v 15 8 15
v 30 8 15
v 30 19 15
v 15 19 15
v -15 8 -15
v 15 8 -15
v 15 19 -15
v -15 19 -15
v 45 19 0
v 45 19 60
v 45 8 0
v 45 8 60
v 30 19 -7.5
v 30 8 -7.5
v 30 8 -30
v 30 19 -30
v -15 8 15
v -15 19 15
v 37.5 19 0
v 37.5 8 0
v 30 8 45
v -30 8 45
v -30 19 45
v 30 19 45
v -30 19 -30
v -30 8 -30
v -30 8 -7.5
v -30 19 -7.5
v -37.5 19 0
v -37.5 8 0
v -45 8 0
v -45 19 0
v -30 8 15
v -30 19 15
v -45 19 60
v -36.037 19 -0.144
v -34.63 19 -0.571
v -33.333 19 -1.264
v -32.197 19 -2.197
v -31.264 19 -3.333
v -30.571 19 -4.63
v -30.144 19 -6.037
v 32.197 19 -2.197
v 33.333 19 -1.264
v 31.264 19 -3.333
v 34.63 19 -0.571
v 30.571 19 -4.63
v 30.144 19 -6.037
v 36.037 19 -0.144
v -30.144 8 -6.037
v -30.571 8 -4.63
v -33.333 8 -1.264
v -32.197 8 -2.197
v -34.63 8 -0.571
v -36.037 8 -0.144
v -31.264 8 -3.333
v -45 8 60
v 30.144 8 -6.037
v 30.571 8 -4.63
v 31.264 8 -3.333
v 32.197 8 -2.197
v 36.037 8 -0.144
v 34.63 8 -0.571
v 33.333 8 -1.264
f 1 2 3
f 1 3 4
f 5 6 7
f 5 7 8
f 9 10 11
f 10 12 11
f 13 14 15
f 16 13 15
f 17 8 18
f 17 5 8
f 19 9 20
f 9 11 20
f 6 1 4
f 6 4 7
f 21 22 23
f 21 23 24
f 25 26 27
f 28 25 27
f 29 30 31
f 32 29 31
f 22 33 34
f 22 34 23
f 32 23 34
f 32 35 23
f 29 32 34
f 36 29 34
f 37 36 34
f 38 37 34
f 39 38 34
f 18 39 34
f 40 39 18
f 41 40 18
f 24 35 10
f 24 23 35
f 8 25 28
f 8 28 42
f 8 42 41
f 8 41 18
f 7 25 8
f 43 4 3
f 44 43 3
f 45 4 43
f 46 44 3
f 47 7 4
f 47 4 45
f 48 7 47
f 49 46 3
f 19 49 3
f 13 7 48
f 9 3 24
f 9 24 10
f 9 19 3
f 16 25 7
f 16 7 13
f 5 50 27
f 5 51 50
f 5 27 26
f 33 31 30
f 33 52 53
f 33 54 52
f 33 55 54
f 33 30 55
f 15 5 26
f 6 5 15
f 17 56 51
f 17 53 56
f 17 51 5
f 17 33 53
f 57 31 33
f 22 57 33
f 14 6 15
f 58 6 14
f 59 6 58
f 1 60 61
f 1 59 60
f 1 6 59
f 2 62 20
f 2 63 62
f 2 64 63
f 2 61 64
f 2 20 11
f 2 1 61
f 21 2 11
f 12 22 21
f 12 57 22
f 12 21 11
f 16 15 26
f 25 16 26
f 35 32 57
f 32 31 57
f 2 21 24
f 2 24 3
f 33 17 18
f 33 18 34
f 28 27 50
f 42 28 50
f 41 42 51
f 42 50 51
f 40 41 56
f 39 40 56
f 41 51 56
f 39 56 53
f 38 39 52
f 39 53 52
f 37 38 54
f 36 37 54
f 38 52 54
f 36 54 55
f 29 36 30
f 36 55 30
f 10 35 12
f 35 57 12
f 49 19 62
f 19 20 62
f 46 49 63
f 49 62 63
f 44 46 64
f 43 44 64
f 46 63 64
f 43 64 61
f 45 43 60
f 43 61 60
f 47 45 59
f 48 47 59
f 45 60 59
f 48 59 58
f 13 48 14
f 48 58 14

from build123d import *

# Parameters (mm, degrees)
CROQUIS1_W                = 30
CROQUIS1_H                = 30
SALIENTE_EXTRUIR1_DEPTH   = 3
CROQUIS2_W                = 15
CROQUIS2_H                = 30
SALIENTE_EXTRUIR3_DEPTH   = 3
SALIENTE_EXTRUIR3_2_DEPTH = 3
CROQUIS3_W                = 30
CROQUIS3_H                = 30
SALIENTE_EXTRUIR4_DEPTH   = 3
SALIENTE_EXTRUIR5_DEPTH   = 3
CORTAR_EXTRUIR1_DEPTH     = 6
SALIENTE_EXTRUIR8_DEPTH   = 11
CROQUIS7_W                = 30
CROQUIS7_H                = 3.175
CORTAR_EXTRUIR3_DEPTH     = 18.542
CROQUIS9_W                = 60
CROQUIS9_H                = 0.175
SALIENTE_EXTRUIR9_DEPTH   = 11
CROQUIS10_W               = 90
CROQUIS10_H               = 5
CORTAR_EXTRUIR5_DEPTH     = 93
CROQUIS11_W               = 30
CROQUIS11_H               = 3.175
SALIENTE_EXTRUIR10_DEPTH  = 11
CROQUIS12_W               = 60
CROQUIS12_H               = 0.175
CORTAR_EXTRUIR6_DEPTH     = 11
CROQUIS13_W               = 30
CROQUIS13_H               = 5
CORTAR_EXTRUIR7_DEPTH     = 10
SALIENTE_EXTRUIR11_DEPTH  = 5


with BuildPart() as part:
    # Croquis1 → Saliente-Extruir1 (new body)
    with BuildSketch(Plane(origin=(0, 0, 0), x_dir=(1, 0, 0), z_dir=(0, 1, 0))):
        Rectangle(CROQUIS1_W, CROQUIS1_H)
    extrude(amount=SALIENTE_EXTRUIR1_DEPTH)



with BuildPart() as body_2:
    # Croquis2 → Saliente-Extruir3 (new body)
    with BuildSketch(Plane(origin=(0, 3, 0), x_dir=(1, 0, 0), z_dir=(0, 1, 0))):
        with Locations((-22.5, -30)):
            Rectangle(CROQUIS2_W, CROQUIS2_H)
    extrude(amount=-SALIENTE_EXTRUIR3_DEPTH)


with BuildPart() as body_3:
    # Croquis2 → Saliente-Extruir3 2 (new body)
    with BuildSketch(Plane(origin=(0, 3, 0), x_dir=(1, 0, 0), z_dir=(0, 1, 0))):
        with Locations((22.5, -30)):
            Rectangle(CROQUIS2_W, CROQUIS2_H)
    extrude(amount=-SALIENTE_EXTRUIR3_2_DEPTH)


with BuildPart() as part_1:
    add(part.part)

    add(body_2.part)  # Saliente-Extruir4 merges body 2

    add(body_3.part)  # Saliente-Extruir4 merges body 3
    # Croquis3 → Saliente-Extruir4 (add)
    with BuildSketch(Plane(origin=(0, 3, 0), x_dir=(1, 0, 0), z_dir=(0, 1, 0))):
        with Locations((0, -30)):
            Rectangle(CROQUIS3_W, CROQUIS3_H)
    extrude(amount=-SALIENTE_EXTRUIR4_DEPTH)

    # Croquis4 → Saliente-Extruir5 (add)
    with BuildSketch(Plane(origin=(0, 3, 0), x_dir=(1, 0, 0), z_dir=(0, 1, 0))):
        Polygon((-30, 0), (-45, 0), (-45, -60), (45, -60), (45, 0), (30, 0), (30, 30), (-30, 30), align=None)
    extrude(amount=SALIENTE_EXTRUIR5_DEPTH)

    # Croquis5 → Cortar-Extruir1 (cut)
    with BuildSketch(Plane(origin=(0, 0, 0), x_dir=(-1, 0, 0), z_dir=(0, -1, 0))):
        Polygon((30, -45), (30, -15), (15, -15), (15, 15), (-15, 15), (-15, -15), (-30, -15), (-30, -45), align=None)
    extrude(amount=-CORTAR_EXTRUIR1_DEPTH, mode=Mode.SUBTRACT)

    # Croquis6 → Saliente-Extruir8 (add)
    with BuildSketch(Plane(origin=(0, 3, 0), x_dir=(-1, 0, 0), z_dir=(0, -1, 0))):
        with BuildLine():
            Line((37.5, 0), (45, 0))
            Line((45, 0), (45, -60))
            Line((45, -60), (-45, -60))
            Line((-45, -60), (-45, 0))
            Line((-45, 0), (-37.5, 0))
            ThreePointArc((-37.5, 0), (-32.196699141, 2.196699141), (-30, 7.5))
            Line((-30, 7.5), (-30, 30))
            Line((-30, 30), (30, 30))
            Line((30, 30), (30, 7.5))
            ThreePointArc((30, 7.5), (32.196699141, 2.196699141), (37.5, 0))
        make_face()
        Polygon((15, 15), (15, -15), (30, -15), (30, -45), (-30, -45), (-30, -15), (-15, -15), (-15, 15), align=None, mode=Mode.SUBTRACT)
    extrude(amount=-SALIENTE_EXTRUIR8_DEPTH)

    # Croquis7 → Cortar-Extruir3 (cut)
    with BuildSketch(Plane(origin=(0, 14, 0), x_dir=(1, 0, 0), z_dir=(0, 1, 0))):
        with Locations((0, 16.5875)):
            Rectangle(CROQUIS7_W, CROQUIS7_H)
    extrude(amount=-CORTAR_EXTRUIR3_DEPTH, mode=Mode.SUBTRACT)

    # Croquis9 → Saliente-Extruir9 (add)
    with BuildSketch(Plane(origin=(0, 14, 0), x_dir=(1, 0, 0), z_dir=(0, 1, 0))):
        with Locations((0, 30.0875)):
            Rectangle(CROQUIS9_W, CROQUIS9_H)
    extrude(amount=-SALIENTE_EXTRUIR9_DEPTH)

    # Croquis10 → Cortar-Extruir5 (cut)
    with BuildSketch(Plane.XY.offset(60)):
        with Locations((0, 5.5)):
            Rectangle(CROQUIS10_W, CROQUIS10_H)
    extrude(amount=-CORTAR_EXTRUIR5_DEPTH, mode=Mode.SUBTRACT)

    # Croquis11 → Saliente-Extruir10 (add)
    with BuildSketch(Plane(origin=(0, 14, 0), x_dir=(1, 0, 0), z_dir=(0, 1, 0))):
        with Locations((0, 16.5875)):
            Rectangle(CROQUIS11_W, CROQUIS11_H)
    extrude(amount=-SALIENTE_EXTRUIR10_DEPTH)

    # Croquis12 → Cortar-Extruir6 (cut)
    with BuildSketch(Plane(origin=(0, 14, 0), x_dir=(1, 0, 0), z_dir=(0, 1, 0))):
        with Locations((0, 30.0875)):
            Rectangle(CROQUIS12_W, CROQUIS12_H)
    extrude(amount=-CORTAR_EXTRUIR6_DEPTH, mode=Mode.SUBTRACT)

    # Croquis13 → Cortar-Extruir7 (cut)
    with BuildSketch(Plane.XY.offset(-15)):
        with Locations((0, 5.5)):
            Rectangle(CROQUIS13_W, CROQUIS13_H)
    extrude(amount=-CORTAR_EXTRUIR7_DEPTH, mode=Mode.SUBTRACT)

    # Croquis14 → Saliente-Extruir11 (add)
    with BuildSketch(Plane(origin=(0, 14, 0), x_dir=(1, 0, 0), z_dir=(0, 1, 0))):
        with BuildLine():
            Line((-37.5, 0), (-45, 0))
            Line((-45, 0), (-45, -60))
            Line((-45, -60), (45, -60))
            Line((45, -60), (45, 0))
            Line((45, 0), (37.5, 0))
            ThreePointArc((37.5, 0), (32.196699141, 2.196699141), (30, 7.5))
            Line((30, 7.5), (30, 30))
            Line((30, 30), (-30, 30))
            Line((-30, 30), (-30, 7.5))
            ThreePointArc((-30, 7.5), (-32.196699141, 2.196699141), (-37.5, 0))
        make_face()
        Polygon((-15, 15), (-15, -15), (-30, -15), (-30, -45), (30, -45), (30, -15), (15, -15), (15, 15), align=None, mode=Mode.SUBTRACT)
    extrude(amount=SALIENTE_EXTRUIR11_DEPTH)


solid = part_1.part
